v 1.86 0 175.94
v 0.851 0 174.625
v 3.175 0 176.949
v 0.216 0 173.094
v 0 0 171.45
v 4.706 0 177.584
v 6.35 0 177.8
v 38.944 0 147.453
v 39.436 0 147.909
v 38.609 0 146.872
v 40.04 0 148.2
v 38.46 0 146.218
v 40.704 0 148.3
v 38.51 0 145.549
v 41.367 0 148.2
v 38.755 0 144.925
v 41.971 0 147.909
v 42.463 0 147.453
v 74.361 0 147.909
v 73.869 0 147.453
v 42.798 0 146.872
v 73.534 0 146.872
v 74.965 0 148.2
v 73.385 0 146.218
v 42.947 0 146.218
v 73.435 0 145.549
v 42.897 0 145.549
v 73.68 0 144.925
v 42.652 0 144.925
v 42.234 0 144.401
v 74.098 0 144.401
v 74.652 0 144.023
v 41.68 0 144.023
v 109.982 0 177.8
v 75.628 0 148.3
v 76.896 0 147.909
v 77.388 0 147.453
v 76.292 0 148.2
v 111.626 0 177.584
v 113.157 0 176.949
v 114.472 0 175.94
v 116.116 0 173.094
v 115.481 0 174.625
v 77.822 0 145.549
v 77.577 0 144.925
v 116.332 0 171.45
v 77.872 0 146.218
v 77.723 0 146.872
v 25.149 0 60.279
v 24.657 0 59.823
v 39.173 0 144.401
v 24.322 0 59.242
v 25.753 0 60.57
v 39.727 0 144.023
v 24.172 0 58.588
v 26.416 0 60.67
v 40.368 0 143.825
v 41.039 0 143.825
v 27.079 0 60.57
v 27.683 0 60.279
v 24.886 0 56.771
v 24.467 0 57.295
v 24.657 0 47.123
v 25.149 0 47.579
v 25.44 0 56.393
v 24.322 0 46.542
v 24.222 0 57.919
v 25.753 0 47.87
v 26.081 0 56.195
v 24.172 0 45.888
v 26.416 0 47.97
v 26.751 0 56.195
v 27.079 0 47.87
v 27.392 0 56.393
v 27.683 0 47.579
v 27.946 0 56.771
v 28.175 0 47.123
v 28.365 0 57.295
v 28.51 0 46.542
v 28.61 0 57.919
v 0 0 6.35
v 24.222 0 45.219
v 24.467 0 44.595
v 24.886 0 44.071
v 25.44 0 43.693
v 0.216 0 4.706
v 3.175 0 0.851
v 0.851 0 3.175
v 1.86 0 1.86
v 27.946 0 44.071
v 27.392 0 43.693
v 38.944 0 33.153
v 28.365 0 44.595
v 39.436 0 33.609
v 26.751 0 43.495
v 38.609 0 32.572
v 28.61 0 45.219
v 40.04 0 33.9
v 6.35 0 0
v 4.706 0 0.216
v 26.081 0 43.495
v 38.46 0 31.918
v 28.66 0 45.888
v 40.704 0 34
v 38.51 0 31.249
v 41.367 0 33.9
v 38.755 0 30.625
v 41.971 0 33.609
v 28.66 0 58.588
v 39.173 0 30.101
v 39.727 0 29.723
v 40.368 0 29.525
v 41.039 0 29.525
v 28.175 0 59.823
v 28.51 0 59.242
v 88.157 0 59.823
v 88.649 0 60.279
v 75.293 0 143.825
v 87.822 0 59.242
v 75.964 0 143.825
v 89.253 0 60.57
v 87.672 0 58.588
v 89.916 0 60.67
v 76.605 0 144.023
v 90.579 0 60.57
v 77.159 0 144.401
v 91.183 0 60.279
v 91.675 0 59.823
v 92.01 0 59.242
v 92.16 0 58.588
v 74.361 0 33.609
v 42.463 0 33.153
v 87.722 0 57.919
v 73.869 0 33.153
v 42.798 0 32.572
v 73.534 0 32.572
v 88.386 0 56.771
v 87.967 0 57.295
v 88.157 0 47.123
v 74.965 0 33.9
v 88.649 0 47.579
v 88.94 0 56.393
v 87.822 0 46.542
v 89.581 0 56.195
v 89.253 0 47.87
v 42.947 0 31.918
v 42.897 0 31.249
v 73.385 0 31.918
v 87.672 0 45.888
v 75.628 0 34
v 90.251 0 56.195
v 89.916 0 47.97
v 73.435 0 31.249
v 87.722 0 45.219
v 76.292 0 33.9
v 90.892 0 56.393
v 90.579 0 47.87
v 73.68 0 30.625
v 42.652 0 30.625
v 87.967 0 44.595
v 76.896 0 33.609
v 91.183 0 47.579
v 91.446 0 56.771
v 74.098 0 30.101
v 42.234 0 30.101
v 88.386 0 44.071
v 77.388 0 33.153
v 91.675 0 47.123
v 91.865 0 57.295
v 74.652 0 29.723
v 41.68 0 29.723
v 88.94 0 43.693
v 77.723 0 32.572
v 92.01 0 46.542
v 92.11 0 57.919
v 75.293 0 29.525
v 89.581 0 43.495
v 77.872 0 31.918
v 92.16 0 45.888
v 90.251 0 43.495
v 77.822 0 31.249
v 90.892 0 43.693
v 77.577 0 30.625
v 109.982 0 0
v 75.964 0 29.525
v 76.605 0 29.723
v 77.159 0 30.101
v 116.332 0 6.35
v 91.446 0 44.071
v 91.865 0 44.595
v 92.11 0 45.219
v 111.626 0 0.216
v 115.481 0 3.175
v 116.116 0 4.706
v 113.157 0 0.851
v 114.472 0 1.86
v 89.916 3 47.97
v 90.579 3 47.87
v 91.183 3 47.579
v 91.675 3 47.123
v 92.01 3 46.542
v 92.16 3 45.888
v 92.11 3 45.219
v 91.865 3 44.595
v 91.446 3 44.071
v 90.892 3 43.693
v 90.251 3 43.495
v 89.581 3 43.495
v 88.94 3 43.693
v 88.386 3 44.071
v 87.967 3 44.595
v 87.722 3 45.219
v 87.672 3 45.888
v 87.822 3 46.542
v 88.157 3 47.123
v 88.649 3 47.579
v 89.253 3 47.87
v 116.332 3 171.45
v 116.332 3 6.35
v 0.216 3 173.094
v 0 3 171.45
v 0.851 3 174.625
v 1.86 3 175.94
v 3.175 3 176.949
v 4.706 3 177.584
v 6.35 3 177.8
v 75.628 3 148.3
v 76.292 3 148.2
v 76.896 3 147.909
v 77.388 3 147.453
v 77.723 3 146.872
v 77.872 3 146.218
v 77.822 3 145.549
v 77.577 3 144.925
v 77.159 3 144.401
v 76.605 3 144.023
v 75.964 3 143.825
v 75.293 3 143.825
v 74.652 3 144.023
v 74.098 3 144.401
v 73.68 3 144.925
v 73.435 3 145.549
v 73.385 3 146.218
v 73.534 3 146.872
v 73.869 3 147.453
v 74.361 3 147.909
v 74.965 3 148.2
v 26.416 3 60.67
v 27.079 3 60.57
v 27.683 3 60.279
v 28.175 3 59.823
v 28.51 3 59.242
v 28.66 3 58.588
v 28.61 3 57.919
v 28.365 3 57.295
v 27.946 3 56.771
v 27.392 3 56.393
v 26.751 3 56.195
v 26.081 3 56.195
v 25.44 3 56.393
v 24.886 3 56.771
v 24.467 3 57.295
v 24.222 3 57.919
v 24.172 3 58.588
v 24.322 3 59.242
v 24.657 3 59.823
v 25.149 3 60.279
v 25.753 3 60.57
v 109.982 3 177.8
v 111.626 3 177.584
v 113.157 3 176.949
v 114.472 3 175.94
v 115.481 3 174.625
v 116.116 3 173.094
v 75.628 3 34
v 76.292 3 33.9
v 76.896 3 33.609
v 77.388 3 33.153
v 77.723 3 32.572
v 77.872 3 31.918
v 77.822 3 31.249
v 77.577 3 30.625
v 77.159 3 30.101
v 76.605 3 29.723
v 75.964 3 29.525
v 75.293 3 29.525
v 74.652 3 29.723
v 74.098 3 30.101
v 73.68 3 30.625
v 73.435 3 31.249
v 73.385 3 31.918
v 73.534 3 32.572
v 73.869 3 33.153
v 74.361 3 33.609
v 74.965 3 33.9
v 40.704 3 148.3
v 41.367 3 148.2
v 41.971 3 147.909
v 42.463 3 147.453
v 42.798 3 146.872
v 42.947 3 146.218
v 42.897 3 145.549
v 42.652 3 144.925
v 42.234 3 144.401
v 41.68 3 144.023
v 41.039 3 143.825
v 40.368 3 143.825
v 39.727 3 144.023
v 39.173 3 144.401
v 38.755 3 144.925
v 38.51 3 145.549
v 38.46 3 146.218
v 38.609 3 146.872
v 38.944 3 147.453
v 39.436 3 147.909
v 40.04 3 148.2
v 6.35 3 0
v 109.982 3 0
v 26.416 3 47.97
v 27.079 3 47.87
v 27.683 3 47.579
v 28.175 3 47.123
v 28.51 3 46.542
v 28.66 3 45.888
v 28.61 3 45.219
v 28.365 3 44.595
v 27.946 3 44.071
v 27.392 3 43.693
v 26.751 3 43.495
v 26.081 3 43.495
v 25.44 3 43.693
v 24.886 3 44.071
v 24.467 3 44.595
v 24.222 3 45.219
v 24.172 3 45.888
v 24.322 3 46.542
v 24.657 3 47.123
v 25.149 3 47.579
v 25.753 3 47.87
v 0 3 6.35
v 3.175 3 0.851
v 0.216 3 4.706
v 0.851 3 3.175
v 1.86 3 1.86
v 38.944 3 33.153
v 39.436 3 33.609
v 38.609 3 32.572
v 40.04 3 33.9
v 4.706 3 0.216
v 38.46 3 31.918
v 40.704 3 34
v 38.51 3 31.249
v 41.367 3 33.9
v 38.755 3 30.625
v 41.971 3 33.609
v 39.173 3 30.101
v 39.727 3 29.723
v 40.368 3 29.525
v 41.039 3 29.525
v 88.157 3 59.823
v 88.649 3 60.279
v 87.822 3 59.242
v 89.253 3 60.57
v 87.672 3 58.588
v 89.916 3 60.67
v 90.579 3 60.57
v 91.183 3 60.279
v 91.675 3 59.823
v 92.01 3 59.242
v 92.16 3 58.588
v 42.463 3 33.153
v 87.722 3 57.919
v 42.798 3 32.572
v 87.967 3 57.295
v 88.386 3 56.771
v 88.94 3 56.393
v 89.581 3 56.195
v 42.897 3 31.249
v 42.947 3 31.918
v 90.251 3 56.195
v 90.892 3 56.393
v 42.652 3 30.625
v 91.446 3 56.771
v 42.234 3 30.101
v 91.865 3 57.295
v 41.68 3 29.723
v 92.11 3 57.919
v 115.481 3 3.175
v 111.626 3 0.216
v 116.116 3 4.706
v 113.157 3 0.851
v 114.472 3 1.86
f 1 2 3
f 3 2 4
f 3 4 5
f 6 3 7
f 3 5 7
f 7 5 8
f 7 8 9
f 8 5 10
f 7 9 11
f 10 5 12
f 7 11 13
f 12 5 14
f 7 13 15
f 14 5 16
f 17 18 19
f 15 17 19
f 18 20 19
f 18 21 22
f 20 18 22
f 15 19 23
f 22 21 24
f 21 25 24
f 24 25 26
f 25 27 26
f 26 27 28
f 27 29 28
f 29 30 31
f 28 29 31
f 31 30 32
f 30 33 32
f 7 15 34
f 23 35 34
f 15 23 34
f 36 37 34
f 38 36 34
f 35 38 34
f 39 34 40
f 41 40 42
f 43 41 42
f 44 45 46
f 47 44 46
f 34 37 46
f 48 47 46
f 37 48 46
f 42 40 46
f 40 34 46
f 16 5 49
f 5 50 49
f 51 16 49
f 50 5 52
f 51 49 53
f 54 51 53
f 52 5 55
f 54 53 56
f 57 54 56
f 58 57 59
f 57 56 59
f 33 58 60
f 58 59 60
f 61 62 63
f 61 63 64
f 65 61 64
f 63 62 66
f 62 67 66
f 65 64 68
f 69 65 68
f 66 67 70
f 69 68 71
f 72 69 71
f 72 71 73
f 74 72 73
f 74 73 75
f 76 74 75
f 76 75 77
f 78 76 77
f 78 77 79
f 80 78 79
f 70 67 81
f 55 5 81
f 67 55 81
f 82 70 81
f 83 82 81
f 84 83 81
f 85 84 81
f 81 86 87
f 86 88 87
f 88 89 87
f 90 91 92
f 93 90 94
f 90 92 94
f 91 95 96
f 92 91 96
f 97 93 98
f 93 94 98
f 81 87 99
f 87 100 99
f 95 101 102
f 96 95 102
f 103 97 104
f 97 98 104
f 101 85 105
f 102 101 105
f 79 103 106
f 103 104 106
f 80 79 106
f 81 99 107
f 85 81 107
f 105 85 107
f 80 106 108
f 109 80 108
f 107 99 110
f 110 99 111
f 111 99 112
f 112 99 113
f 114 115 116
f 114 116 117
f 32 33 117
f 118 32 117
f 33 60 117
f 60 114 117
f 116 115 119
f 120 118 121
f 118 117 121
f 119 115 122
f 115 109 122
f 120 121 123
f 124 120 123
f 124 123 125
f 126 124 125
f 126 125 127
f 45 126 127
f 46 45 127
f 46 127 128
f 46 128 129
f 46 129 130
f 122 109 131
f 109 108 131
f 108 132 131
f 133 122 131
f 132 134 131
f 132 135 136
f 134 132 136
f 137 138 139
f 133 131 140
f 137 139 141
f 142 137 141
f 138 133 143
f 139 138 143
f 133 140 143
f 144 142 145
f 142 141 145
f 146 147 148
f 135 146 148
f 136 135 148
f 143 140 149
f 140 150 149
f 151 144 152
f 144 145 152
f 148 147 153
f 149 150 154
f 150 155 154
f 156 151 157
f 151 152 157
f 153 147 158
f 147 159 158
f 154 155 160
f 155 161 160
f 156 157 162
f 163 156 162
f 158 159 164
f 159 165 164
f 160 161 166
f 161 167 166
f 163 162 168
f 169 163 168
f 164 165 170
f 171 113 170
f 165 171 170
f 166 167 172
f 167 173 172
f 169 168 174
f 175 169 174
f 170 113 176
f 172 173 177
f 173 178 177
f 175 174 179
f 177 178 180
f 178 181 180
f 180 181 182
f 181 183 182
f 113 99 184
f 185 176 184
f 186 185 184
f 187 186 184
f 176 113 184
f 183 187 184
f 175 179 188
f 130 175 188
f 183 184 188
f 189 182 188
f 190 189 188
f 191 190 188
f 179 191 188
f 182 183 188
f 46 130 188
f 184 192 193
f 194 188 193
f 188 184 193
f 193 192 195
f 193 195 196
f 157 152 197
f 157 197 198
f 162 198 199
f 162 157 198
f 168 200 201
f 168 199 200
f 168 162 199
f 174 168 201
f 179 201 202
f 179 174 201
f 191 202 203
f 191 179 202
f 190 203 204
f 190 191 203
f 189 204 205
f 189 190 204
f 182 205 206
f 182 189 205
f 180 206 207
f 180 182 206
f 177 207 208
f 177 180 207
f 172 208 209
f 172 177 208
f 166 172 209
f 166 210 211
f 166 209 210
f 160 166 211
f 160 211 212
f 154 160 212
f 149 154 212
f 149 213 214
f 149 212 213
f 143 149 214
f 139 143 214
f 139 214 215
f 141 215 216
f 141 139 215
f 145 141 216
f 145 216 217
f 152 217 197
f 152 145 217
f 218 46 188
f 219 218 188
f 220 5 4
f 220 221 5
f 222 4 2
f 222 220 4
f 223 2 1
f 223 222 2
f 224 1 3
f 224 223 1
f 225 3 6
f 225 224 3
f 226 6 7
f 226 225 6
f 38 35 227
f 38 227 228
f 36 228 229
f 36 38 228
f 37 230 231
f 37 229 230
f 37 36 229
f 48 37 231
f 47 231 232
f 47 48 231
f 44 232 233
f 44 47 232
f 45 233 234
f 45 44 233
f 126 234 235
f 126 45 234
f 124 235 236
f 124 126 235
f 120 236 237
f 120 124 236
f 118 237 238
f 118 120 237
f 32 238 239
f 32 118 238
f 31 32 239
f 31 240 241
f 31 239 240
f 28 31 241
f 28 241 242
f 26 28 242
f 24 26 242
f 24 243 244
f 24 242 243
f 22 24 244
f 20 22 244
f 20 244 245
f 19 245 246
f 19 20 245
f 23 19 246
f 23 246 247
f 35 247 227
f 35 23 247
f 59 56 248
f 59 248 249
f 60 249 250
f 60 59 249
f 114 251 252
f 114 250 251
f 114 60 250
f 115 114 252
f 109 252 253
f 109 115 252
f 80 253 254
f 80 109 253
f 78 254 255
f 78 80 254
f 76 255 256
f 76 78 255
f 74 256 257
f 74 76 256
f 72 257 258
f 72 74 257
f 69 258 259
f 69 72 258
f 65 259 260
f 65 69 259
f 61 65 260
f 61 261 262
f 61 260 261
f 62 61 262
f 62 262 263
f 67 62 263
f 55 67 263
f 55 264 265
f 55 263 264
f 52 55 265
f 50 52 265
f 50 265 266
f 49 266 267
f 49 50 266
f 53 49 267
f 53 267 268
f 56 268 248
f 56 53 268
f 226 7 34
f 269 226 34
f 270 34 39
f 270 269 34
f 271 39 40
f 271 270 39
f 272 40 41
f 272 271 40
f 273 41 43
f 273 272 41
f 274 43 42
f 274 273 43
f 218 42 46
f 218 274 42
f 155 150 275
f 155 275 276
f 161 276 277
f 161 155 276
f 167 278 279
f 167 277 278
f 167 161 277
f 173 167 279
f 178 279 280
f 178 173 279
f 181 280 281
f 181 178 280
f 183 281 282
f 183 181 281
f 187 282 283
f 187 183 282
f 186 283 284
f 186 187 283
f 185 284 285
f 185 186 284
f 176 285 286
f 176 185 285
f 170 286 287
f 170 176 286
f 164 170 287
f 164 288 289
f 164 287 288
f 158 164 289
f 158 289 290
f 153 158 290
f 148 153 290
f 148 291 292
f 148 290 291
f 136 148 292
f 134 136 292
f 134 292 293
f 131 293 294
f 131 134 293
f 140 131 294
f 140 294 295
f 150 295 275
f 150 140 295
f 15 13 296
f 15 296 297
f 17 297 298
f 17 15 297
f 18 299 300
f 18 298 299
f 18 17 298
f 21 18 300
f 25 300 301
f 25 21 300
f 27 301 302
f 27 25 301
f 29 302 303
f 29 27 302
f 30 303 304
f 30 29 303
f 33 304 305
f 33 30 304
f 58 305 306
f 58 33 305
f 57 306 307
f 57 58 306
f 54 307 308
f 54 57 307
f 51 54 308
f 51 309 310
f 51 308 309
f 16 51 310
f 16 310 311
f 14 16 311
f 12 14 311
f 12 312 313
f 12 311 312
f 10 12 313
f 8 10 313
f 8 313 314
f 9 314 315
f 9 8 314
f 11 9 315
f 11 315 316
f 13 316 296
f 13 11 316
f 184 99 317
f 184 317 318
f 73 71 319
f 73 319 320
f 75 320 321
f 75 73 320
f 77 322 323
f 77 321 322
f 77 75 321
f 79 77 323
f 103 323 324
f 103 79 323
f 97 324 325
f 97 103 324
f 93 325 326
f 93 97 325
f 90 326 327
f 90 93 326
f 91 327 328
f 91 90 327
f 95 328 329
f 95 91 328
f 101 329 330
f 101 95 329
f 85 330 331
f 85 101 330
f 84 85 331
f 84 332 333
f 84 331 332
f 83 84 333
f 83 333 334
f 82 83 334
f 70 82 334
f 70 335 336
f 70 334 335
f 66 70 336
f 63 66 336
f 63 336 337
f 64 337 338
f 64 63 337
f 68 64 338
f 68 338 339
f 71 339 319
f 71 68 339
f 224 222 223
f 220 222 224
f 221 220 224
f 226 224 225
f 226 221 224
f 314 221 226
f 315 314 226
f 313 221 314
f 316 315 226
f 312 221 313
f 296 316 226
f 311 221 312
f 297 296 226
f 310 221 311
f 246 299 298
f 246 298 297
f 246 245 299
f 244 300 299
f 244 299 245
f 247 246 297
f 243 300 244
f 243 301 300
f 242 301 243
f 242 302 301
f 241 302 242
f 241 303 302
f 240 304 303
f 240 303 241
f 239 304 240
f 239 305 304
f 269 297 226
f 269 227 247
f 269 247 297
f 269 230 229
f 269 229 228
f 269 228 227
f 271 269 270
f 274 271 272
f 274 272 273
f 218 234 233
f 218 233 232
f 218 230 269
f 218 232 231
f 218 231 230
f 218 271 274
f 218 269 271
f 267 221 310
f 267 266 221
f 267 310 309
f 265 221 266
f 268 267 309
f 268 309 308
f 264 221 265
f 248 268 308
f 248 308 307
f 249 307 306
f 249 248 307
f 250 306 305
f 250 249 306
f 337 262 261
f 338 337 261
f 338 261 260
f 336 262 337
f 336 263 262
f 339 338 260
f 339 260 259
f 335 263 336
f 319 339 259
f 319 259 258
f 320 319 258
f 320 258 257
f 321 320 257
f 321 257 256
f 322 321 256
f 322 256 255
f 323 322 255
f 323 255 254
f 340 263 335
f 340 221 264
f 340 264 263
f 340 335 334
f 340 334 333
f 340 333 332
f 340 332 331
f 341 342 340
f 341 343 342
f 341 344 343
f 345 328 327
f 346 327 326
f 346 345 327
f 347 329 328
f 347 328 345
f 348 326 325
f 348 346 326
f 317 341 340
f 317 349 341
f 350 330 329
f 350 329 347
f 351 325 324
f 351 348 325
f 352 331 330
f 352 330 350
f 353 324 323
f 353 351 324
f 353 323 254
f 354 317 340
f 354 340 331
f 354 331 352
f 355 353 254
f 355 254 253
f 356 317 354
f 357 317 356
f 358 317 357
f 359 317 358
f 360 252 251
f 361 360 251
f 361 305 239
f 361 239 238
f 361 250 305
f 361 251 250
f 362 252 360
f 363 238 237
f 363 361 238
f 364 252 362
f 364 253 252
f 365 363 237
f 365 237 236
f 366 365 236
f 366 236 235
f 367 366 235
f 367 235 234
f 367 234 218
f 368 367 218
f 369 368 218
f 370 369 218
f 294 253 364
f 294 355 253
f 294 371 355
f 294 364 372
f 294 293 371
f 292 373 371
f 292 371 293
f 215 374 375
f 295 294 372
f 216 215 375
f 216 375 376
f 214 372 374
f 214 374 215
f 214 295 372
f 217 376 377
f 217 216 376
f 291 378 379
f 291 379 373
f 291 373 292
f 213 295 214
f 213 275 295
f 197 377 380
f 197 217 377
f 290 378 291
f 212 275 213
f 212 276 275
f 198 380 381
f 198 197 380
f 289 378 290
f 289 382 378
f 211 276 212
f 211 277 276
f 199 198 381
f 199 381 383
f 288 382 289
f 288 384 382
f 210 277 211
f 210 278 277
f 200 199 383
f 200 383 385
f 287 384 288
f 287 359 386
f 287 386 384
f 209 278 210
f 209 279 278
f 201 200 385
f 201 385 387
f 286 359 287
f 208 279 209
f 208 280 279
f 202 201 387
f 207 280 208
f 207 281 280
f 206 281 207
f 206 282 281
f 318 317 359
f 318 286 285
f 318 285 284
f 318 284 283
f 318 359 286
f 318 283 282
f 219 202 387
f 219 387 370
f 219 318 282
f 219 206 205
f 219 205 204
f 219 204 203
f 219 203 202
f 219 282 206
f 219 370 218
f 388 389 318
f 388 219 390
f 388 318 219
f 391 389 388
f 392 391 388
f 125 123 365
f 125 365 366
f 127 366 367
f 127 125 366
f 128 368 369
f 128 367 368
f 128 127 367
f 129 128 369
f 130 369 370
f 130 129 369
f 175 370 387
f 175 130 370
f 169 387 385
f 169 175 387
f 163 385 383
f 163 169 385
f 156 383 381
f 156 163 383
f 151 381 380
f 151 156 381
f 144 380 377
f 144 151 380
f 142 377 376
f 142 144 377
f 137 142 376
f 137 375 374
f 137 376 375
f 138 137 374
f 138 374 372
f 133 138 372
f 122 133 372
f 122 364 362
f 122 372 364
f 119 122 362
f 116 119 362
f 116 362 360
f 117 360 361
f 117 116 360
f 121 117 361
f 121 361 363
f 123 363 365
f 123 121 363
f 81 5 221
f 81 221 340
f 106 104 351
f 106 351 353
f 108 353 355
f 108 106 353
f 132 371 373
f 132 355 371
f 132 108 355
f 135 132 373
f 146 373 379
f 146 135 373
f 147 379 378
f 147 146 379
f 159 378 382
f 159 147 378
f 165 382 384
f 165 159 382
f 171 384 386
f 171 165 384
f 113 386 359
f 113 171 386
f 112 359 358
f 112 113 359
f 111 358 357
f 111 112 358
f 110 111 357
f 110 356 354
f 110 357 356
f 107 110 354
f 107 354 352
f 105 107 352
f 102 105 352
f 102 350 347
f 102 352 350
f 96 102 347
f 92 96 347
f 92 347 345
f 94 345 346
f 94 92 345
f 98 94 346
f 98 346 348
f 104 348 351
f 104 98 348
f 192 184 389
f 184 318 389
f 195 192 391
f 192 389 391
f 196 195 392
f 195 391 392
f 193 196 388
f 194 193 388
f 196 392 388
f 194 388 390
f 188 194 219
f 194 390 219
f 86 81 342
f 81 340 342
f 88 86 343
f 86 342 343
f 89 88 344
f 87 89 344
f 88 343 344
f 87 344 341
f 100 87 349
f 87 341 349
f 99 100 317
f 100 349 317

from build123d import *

# Parameters (mm, degrees)
SKETCH1_W               = 116.332
SKETCH1_H               = 177.8
BOSS_EXTRUDE1_DEPTH     = 3
CUT_EXTRUDE1_DEPTH      = 213.496998153
CUT_EXTRUDE1_DEPTH_BACK = 213.496998153
SKETCH3_R               = 2.25
CUT_EXTRUDE2_DEPTH      = 213.496998153
CUT_EXTRUDE2_DEPTH_BACK = 213.496998153
SKETCH4_R               = 2.25
FILLET1_R               = 6.35


with BuildPart() as part:
    # Sketch1 → Boss-Extrude1 (new body)
    with BuildSketch(Plane(origin=(0, 0, 0), x_dir=(1, 0, 0), z_dir=(0, 1, 0))):
        with Locations((58.166, -88.9)):
            Rectangle(SKETCH1_W, SKETCH1_H)
    extrude(amount=BOSS_EXTRUDE1_DEPTH)

    # Sketch3 → Cut-Extrude1 (cut, two sides: drawn at the far end of the back side and taken through both)
    with BuildSketch(Plane(origin=(0, 3, 0), x_dir=(1, 0, 0), z_dir=(0, 1, 0)).offset(-CUT_EXTRUDE1_DEPTH_BACK)):
        with Locations(Location((26.416, -45.72, 0), (0, 0, 270))):
            Circle(SKETCH3_R)
        with Locations(Location((26.416, -58.42, 0), (0, 0, 270))):
            Circle(SKETCH3_R)
        with Locations(Location((89.916, -45.72, 0), (0, 0, 270))):
            Circle(SKETCH3_R)
        with Locations(Location((89.916, -58.42, 0), (0, 0, 270))):
            Circle(SKETCH3_R)
    extrude(amount=CUT_EXTRUDE1_DEPTH + CUT_EXTRUDE1_DEPTH_BACK, mode=Mode.SUBTRACT)

    # Sketch4 → Cut-Extrude2 (cut, two sides: drawn at the far end of the back side and taken through both)
    with BuildSketch(Plane(origin=(0, 3, 0), x_dir=(1, 0, 0), z_dir=(0, 1, 0)).offset(-CUT_EXTRUDE2_DEPTH_BACK)):
        with Locations(Location((40.7035, -31.75, 0), (0, 0, 270))):
            Circle(SKETCH4_R)
        with Locations(Location((75.6285, -31.75, 0), (0, 0, 270))):
            Circle(SKETCH4_R)
        with Locations(Location((40.7035, -146.05, 0), (0, 0, 270))):
            Circle(SKETCH4_R)
        with Locations(Location((75.6285, -146.05, 0), (0, 0, 270))):
            Circle(SKETCH4_R)
    extrude(amount=CUT_EXTRUDE2_DEPTH + CUT_EXTRUDE2_DEPTH_BACK, mode=Mode.SUBTRACT)

    # Fillet1
    fillet1_edges = [part.edges().sort_by_distance(p)[0] for p in [
        (116.332, 1.5, 0),
        (116.332, 1.5, 177.8),
        (0, 1.5, 177.8),
        (0, 1.5, 0),
    ]]
    fillet(fillet1_edges, radius=FILLET1_R)


solid = part.part
